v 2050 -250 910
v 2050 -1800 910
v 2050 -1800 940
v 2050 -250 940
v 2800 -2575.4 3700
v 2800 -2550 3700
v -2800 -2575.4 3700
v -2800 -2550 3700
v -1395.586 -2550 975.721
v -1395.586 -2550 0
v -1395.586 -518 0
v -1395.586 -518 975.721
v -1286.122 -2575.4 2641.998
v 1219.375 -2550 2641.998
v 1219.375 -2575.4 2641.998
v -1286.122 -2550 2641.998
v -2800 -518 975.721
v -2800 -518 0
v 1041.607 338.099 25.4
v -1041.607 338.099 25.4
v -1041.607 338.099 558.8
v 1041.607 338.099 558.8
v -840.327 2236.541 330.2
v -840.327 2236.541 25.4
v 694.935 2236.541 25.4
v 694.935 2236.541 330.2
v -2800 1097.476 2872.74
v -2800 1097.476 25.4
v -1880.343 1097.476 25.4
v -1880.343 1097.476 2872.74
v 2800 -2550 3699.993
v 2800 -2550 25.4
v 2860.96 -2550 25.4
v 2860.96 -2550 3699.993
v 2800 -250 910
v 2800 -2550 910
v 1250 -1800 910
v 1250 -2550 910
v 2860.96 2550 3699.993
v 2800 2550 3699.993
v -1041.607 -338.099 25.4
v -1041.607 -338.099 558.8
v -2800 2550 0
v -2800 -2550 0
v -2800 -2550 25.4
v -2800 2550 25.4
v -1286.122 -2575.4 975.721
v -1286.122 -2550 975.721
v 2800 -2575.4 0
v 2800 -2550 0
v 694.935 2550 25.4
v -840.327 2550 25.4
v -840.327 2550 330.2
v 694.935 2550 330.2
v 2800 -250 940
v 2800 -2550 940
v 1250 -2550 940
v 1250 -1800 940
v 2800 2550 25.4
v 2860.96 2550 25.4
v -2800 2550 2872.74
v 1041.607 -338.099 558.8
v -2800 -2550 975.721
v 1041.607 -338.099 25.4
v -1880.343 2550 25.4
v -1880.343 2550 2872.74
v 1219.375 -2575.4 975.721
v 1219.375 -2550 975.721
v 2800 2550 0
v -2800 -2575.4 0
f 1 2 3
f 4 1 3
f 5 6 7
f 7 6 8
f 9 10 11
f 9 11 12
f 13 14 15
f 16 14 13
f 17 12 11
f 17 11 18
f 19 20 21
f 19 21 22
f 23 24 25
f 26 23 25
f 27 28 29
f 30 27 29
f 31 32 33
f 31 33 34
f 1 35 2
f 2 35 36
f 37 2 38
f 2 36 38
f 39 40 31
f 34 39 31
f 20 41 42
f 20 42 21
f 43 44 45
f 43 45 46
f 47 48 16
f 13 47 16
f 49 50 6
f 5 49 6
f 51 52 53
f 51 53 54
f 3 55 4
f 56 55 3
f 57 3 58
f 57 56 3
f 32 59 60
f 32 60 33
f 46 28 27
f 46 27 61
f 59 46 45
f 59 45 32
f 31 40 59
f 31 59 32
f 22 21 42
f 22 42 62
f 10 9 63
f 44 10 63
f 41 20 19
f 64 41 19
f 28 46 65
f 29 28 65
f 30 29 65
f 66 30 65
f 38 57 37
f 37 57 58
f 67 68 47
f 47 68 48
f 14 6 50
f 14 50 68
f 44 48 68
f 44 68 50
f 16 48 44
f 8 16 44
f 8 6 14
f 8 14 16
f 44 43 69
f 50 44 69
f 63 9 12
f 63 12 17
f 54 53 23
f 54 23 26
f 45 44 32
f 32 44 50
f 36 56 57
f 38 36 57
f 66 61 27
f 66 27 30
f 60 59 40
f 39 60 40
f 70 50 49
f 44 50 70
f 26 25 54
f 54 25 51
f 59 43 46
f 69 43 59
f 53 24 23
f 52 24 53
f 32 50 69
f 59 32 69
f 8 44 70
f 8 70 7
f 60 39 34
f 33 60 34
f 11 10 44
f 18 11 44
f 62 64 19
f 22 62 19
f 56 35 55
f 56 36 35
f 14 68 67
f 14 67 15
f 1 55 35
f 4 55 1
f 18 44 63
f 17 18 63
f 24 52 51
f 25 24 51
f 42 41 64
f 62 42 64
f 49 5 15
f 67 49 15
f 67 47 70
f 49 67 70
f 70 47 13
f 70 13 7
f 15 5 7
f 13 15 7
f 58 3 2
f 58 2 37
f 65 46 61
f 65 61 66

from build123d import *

# Parameters (mm, degrees)
F0_W        = 5600
F0_H        = 5100
F2_DEPTH    = 25.4
F6_E3_W     = 1550
F6_E3_H     = 750
F7_DEPTH    = 30
F8_W        = 750
F8_H        = 30
F9_DEPTH    = 1550
F1_E0_TOP_W = 5600
F1_E0_TOP_H = 3700
F10_DEPTH   = 25.4
F4_E1_W     = 5100
F4_E1_H     = 3674.5926
F11_DEPTH   = 60.96
F12_W       = 2505.4972171783
F12_H       = 1666.2773489952
F13_DEPTH   = 330.2
F14_W       = 1404.4142246246
F14_H       = 975.7207036018
F15_DEPTH   = 2032
F16_W       = 919.6570396423
F16_H       = 1452.5243520737
F17_DEPTH   = 2847.34
F18_W       = 2083.2133293152
F18_H       = 676.1979460716
F19_DEPTH   = 533.4
F20_W       = 1535.2616906166
F20_H       = 313.4592056274
F21_DEPTH   = 304.8


with BuildPart() as f2:
    # F0 (on Top) → F2 (new body)
    with BuildSketch(Plane.XY):
        Rectangle(F0_W, F0_H)
    extrude(amount=F2_DEPTH)


with BuildPart() as f7:
    # F6_E3 (on explicit) → F7 (new body)
    with BuildSketch(Plane(origin=(2800, -2550, 940), x_dir=(-1, 0, 0), z_dir=(0, 0, -1))):
        with Locations((775, 375)):
            Rectangle(F6_E3_W, F6_E3_H)
    extrude(amount=F7_DEPTH)

    # F8 (on face) → F9 (join)
    with BuildSketch(Plane(origin=(0, -1800, 0), x_dir=(-1, 0, 0), z_dir=(0, 1, 0))):
        with Locations((-2425, 925)):
            Rectangle(F8_W, F8_H)
    extrude(amount=F9_DEPTH)


with BuildPart() as f10:
    # F1_E0_top (on explicit) → F10 (new body)
    with BuildSketch(Plane(origin=(2800, -2550, 0), x_dir=(-1, 0, 0), z_dir=(0, 1, 0))):
        with Locations((2800, 1850)):
            Rectangle(F1_E0_TOP_W, F1_E0_TOP_H)
    extrude(amount=-F10_DEPTH)

    # F12 (on face) → F13 (cut)
    with BuildSketch(Plane(origin=(0, -2550, 0), x_dir=(-1, 0, 0), z_dir=(0, 1, 0))):
        with Locations((33.3737134933, 1808.8593780994)):
            Rectangle(F12_W, F12_H)
    extrude(amount=-F13_DEPTH, mode=Mode.SUBTRACT)


with BuildPart() as f11:
    # F4_E1 (on explicit) → F11 (new body)
    with BuildSketch(Plane(origin=(2800, 2550, 25.4), x_dir=(0, -1, 0), z_dir=(-1, 0, 0))):
        with Locations((2550, 1837.2963)):
            Rectangle(F4_E1_W, F4_E1_H)
    extrude(amount=-F11_DEPTH)


with BuildPart() as f15:
    # F14 (on face) → F15 (new body)
    with BuildSketch(Plane(origin=(0, -2550, 0), x_dir=(-1, 0, 0), z_dir=(0, 1, 0))):
        with Locations((2097.7928876877, 487.8603518009)):
            Rectangle(F14_W, F14_H)
    extrude(amount=F15_DEPTH)


with BuildPart() as f17:
    # F16 (on face) → F17 (new body)
    with BuildSketch(Plane.XY.offset(25.4)):
        with Locations((-2340.1714801788, 1823.7378239632)):
            Rectangle(F16_W, F16_H)
    extrude(amount=F17_DEPTH)


with BuildPart() as f19:
    # F18 (on face) → F19 (new body)
    with BuildSketch(Plane.XY.offset(25.4)):
        Rectangle(F18_W, F18_H)
    extrude(amount=F19_DEPTH)


with BuildPart() as f21:
    # F20 (on face) → F21 (new body)
    with BuildSketch(Plane.XY.offset(25.4)):
        with Locations((-72.6961791515, 2393.2703971863)):
            Rectangle(F20_W, F20_H)
    extrude(amount=F21_DEPTH)


solid = Compound([f2.part, f7.part, f10.part, f11.part, f15.part, f17.part, f19.part, f21.part])
